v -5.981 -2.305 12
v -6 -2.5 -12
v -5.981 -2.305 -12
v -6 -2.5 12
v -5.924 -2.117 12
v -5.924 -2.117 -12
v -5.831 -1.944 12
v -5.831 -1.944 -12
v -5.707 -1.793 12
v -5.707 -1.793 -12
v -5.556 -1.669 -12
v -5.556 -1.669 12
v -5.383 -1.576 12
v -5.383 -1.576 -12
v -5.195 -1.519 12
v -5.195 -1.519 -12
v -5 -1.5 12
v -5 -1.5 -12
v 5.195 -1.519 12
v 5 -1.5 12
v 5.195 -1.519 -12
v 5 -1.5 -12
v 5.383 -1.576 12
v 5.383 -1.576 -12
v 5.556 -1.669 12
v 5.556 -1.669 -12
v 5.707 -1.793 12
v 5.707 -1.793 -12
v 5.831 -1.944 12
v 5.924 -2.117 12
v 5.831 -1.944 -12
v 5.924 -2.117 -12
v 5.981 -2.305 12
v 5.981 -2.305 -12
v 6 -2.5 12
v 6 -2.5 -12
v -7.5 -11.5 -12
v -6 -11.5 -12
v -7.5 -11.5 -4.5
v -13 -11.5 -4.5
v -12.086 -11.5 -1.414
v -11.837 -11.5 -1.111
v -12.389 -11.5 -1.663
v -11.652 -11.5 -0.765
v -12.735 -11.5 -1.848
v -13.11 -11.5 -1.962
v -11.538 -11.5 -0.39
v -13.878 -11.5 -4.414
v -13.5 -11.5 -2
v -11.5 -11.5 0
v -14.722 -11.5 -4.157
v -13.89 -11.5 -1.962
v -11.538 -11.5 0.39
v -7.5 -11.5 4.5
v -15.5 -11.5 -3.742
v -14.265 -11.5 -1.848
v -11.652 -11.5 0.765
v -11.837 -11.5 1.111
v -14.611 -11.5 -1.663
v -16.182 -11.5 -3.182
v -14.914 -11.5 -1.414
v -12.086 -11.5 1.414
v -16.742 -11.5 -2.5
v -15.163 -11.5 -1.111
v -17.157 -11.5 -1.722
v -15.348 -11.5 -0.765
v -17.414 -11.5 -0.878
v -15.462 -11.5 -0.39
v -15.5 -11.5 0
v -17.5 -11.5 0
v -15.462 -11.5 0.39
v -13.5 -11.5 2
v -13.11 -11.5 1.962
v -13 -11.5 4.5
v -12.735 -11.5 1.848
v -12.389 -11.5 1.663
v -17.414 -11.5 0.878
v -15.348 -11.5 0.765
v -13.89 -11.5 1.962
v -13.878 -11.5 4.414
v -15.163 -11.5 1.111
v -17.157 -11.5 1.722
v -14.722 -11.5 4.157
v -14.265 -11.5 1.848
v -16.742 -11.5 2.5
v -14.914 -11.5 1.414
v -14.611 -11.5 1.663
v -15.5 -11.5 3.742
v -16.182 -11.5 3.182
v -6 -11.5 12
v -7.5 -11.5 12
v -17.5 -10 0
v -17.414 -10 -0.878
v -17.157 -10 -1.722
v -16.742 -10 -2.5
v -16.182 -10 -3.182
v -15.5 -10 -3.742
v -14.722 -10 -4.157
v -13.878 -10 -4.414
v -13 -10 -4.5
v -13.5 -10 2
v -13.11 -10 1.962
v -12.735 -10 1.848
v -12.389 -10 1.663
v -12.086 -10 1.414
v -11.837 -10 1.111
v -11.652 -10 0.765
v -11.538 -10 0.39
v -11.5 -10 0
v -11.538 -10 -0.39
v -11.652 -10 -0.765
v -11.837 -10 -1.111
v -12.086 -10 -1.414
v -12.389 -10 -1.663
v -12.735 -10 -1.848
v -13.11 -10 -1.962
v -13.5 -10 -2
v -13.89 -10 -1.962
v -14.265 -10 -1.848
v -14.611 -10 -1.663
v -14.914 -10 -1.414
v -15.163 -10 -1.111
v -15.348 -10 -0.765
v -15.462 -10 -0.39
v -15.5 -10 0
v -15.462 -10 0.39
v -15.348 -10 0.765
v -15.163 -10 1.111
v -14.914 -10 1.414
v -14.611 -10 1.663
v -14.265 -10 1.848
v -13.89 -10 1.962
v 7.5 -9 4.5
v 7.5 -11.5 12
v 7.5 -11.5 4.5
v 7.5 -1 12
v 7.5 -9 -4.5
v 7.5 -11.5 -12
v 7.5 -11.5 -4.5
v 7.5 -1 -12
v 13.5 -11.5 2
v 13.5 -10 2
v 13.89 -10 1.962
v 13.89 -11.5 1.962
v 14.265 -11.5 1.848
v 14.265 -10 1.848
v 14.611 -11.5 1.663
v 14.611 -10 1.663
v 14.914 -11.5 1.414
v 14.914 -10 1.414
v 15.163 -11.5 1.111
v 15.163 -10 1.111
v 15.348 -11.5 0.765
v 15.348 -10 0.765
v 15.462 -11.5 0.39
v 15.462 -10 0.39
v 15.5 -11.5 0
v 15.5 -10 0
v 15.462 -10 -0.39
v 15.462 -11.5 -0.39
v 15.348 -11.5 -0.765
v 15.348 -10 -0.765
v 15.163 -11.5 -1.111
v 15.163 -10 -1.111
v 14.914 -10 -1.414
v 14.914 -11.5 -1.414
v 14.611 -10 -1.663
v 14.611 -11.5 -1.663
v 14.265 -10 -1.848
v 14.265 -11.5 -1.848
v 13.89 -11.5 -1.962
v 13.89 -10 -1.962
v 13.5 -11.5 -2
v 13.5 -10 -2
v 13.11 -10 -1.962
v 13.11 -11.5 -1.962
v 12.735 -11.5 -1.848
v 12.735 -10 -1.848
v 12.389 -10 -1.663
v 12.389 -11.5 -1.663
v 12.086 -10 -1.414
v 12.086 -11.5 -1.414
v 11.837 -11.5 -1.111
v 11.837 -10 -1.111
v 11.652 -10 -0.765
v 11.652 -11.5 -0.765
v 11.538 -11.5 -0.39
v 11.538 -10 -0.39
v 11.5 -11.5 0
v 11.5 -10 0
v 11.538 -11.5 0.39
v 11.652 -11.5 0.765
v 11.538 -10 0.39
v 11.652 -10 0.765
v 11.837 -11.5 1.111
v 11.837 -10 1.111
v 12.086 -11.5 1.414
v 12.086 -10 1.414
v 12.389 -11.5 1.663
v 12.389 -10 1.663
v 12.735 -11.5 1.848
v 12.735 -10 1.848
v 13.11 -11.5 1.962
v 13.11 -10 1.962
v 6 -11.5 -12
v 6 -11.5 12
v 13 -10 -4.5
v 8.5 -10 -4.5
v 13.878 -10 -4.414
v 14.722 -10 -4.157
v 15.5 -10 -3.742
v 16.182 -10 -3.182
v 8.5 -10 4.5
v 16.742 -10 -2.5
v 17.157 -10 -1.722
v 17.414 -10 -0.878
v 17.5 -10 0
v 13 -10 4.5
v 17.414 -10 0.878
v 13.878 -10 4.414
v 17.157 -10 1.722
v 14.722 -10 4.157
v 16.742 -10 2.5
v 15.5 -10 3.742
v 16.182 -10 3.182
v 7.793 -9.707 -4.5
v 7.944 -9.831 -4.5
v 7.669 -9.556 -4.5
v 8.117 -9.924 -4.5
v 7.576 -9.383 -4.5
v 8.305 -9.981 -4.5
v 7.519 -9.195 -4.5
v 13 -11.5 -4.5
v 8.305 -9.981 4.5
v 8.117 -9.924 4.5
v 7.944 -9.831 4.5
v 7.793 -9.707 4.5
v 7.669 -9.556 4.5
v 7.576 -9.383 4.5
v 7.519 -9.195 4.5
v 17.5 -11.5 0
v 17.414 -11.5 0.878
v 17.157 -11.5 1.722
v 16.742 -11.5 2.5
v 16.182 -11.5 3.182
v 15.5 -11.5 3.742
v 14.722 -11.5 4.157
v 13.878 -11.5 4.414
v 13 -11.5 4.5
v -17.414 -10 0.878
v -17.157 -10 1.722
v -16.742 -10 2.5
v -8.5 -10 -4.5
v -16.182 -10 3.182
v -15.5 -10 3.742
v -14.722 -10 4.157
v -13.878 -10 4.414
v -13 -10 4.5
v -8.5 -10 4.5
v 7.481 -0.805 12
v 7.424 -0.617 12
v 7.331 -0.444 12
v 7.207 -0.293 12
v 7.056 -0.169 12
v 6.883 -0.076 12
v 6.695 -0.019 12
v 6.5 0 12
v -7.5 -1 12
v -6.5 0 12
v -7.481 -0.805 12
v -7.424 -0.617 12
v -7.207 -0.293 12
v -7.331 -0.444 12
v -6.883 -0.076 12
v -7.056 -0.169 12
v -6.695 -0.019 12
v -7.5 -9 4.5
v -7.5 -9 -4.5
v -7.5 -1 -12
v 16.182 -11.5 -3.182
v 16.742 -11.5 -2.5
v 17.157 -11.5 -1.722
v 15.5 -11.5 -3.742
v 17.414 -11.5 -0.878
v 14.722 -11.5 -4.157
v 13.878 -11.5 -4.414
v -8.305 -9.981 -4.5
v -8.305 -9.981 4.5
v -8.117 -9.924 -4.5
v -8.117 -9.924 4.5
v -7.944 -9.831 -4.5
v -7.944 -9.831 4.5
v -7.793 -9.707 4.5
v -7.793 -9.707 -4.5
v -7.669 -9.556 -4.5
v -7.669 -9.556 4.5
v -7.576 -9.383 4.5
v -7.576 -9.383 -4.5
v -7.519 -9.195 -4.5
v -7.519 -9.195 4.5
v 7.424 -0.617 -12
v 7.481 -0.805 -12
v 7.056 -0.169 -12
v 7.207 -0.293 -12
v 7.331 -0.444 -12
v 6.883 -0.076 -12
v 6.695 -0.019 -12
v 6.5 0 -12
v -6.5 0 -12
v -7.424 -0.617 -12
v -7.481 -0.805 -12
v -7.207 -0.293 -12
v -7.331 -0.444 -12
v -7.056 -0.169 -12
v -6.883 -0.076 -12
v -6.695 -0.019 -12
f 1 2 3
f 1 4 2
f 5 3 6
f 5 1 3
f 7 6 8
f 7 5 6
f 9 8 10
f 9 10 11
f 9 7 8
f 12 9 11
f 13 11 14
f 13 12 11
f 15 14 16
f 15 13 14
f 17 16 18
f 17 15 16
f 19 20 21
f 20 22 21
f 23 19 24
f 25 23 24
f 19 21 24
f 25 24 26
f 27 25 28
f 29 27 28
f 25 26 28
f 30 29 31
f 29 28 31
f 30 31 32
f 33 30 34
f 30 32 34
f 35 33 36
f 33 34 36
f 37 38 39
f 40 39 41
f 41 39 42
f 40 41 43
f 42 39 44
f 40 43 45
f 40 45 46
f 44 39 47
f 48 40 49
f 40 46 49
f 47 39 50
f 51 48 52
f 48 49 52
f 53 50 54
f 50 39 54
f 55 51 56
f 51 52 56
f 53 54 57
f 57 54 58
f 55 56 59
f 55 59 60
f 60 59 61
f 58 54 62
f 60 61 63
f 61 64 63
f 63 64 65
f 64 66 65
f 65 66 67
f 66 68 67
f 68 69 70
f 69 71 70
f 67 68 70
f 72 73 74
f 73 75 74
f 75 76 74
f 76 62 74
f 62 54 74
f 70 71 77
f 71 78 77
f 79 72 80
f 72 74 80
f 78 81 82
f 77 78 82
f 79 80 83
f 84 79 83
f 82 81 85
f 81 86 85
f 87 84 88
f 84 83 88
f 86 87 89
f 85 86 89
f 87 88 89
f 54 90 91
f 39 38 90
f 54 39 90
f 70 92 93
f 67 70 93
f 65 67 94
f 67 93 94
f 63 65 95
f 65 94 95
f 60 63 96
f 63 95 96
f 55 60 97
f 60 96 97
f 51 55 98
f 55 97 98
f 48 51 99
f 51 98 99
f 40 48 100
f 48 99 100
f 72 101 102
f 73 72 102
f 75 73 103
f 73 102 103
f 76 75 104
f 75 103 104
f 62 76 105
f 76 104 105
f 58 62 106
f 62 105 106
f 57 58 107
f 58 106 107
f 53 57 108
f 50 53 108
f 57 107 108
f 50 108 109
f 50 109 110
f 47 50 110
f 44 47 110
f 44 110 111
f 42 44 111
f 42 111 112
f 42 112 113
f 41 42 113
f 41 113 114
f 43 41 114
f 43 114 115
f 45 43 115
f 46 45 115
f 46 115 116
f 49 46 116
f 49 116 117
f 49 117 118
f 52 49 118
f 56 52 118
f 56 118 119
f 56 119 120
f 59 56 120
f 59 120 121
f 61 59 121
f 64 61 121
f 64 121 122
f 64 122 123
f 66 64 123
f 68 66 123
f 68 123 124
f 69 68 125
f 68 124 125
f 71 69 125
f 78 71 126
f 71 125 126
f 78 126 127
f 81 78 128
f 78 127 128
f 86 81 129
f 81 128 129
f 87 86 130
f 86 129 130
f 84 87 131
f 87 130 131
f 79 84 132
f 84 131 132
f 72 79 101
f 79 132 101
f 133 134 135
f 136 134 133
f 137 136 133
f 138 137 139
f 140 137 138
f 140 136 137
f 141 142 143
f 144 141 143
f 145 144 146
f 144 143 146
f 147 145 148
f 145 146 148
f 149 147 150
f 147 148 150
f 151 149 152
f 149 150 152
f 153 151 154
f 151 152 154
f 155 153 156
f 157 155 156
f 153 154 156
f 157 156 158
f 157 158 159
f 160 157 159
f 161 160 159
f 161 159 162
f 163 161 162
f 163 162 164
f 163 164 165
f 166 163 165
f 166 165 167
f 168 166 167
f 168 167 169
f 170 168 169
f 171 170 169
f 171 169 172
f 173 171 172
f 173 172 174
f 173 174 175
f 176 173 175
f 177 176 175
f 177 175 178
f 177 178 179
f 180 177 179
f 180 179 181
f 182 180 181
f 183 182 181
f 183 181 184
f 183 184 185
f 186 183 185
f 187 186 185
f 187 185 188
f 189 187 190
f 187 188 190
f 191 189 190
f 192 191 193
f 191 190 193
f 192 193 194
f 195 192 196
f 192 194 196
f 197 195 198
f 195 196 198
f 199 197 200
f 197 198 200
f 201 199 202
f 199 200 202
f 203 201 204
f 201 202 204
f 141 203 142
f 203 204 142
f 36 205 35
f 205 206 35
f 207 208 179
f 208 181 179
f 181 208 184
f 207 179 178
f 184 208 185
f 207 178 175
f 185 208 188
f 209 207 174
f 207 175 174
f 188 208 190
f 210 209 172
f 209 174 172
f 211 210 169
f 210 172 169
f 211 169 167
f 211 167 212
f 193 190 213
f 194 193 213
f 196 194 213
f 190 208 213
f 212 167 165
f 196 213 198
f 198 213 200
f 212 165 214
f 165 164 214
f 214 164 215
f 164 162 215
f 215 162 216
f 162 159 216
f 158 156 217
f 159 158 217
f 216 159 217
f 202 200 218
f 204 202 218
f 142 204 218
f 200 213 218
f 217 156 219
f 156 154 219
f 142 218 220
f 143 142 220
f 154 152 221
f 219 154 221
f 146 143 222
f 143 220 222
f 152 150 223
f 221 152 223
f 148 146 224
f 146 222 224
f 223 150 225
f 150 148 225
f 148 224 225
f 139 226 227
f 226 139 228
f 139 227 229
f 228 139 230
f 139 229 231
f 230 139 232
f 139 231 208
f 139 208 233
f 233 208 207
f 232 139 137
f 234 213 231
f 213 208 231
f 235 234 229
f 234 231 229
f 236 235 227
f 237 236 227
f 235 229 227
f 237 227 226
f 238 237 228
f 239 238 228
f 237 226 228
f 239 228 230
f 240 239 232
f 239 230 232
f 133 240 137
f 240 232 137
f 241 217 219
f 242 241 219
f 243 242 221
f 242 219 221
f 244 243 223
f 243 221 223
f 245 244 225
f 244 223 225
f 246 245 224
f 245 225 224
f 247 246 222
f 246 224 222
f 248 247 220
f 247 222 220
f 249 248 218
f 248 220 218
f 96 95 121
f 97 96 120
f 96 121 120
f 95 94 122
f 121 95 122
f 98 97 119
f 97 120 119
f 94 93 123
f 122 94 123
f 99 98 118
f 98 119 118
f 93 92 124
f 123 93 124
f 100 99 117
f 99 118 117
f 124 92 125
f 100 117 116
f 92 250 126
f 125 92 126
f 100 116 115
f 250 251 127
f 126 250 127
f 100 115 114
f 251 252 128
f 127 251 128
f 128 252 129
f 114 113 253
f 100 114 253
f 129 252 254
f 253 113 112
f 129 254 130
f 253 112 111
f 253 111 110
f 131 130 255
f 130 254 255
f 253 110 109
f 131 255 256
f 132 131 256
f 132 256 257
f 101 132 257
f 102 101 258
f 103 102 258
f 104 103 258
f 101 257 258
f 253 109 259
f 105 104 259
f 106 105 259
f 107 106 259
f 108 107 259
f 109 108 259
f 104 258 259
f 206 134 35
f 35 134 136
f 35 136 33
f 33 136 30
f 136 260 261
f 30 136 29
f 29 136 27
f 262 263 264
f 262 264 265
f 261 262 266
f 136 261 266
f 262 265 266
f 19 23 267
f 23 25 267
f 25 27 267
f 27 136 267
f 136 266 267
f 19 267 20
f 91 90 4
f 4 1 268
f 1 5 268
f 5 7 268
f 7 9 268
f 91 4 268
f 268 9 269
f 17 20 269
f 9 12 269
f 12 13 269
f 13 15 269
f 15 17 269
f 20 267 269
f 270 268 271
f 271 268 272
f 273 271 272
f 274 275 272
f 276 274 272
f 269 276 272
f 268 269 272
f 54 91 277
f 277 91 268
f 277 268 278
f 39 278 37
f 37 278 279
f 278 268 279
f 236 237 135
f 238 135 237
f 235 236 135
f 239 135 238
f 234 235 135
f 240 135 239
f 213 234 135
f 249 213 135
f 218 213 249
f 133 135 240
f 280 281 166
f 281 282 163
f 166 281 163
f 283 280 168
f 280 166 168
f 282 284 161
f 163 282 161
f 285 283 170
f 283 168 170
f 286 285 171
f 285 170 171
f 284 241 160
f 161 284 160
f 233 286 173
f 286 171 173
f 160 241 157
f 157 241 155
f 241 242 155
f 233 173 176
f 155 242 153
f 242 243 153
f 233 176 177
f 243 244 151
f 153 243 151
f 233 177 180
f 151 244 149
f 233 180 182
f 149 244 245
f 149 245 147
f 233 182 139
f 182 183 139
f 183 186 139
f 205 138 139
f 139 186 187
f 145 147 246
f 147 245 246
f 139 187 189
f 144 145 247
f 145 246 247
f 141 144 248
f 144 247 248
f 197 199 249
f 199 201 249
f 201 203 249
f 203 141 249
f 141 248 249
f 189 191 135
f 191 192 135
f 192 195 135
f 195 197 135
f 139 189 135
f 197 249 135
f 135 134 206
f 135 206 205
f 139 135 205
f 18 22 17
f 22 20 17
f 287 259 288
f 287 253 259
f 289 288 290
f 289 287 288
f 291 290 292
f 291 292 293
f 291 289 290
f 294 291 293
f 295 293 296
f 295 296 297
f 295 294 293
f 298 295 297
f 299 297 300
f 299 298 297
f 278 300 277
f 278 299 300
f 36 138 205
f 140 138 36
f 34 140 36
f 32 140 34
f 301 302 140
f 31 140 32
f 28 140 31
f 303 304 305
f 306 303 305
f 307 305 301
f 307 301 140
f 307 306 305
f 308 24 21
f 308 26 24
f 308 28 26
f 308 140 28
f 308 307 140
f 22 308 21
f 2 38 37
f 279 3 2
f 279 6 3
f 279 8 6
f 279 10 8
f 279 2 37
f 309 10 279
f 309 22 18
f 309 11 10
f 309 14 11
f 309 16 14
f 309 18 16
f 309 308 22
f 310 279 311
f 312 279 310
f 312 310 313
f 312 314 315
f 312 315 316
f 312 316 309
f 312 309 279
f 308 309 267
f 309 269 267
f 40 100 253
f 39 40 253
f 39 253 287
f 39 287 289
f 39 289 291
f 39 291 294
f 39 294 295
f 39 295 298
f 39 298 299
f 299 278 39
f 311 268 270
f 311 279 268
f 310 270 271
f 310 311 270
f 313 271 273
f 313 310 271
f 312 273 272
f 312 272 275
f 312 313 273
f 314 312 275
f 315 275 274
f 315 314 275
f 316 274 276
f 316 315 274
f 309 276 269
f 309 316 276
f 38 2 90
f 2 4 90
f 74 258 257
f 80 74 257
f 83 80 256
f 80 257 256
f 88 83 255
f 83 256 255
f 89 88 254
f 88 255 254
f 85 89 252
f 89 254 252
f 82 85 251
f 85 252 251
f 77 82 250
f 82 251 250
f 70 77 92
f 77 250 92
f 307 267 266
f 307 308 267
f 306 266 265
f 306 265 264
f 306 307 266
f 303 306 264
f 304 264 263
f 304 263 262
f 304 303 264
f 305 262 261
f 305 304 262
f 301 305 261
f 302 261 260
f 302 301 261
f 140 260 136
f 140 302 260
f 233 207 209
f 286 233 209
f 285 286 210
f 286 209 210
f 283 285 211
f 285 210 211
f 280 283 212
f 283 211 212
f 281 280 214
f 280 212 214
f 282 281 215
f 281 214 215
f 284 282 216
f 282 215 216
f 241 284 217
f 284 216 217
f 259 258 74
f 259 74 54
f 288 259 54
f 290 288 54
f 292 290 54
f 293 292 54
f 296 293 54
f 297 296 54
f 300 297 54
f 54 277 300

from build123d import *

# Parameters (mm, degrees)
SALIENTE_EXTRUIR2_DEPTH = 12
CROQUIS4_W              = 10
CROQUIS4_H              = 7.5
CORTAR_EXTRUIR2_DEPTH   = 24.457408211
CROQUIS6_R              = 2
CORTAR_EXTRUIR3_DEPTH   = 24.457408211
CORTAR_EXTRUIR4_DEPTH   = 24.457408211
REDONDEO1_R             = 1
REDONDEO2_R             = 1
REDONDEO3_R             = 1
REDONDEO4_R             = 1
REDONDEO5_R             = 1
REDONDEO6_R             = 1


with BuildPart() as part:
    # Croquis1 → Saliente-Extruir2 (new, symmetric)
    with BuildSketch(Plane.XY):
        Polygon((-17.5, -11.5), (-17.5, -10), (-7.5, -10), (-7.5, 0), (7.5, 0), (7.5, -10), (17.5, -10), (17.5, -11.5), (6, -11.5), (6, -1.5), (-6, -1.5), (-6, -11.5), align=None)
    extrude(amount=SALIENTE_EXTRUIR2_DEPTH, both=True)

    # Croquis4 → Cortar-Extruir2 (cut, through all)
    with BuildSketch(Plane(origin=(0, -10, 0), x_dir=(1, 0, 0), z_dir=(0, 1, 0))):
        with Locations((-12.5, 8.25)):
            Rectangle(CROQUIS4_W, CROQUIS4_H)
        with Locations((12.5, 8.25)):
            Rectangle(CROQUIS4_W, CROQUIS4_H)
        with Locations((12.5, -8.25)):
            Rectangle(CROQUIS4_W, CROQUIS4_H)
        with Locations((-12.5, -8.25)):
            Rectangle(CROQUIS4_W, CROQUIS4_H)
    extrude(amount=-CORTAR_EXTRUIR2_DEPTH, mode=Mode.SUBTRACT)

    # Croquis6 → Cortar-Extruir3 (cut, through all)
    with BuildSketch(Plane(origin=(0, -10, 0), x_dir=(1, 0, 0), z_dir=(0, 1, 0))):
        with Locations(Location((-13.5, 0, 0), (0, 0, 270))):
            Circle(CROQUIS6_R)
        with Locations(Location((13.5, 0, 0), (0, 0, 270))):
            Circle(CROQUIS6_R)
    extrude(amount=-CORTAR_EXTRUIR3_DEPTH, mode=Mode.SUBTRACT)

    # Croquis7 → Cortar-Extruir4 (cut, through all)
    with BuildSketch(Plane(origin=(0, -10, 0), x_dir=(1, 0, 0), z_dir=(0, 1, 0))):
        with BuildLine():
            ThreePointArc((-17.5, 0), (-16.181980515, 3.181980515), (-13, 4.5))
            Line((-13, 4.5), (-17.5, 4.5))
            Line((-17.5, 4.5), (-17.5, 0))
        make_face()
        with BuildLine():
            ThreePointArc((-13, -4.5), (-16.181980515, -3.181980515), (-17.5, 0))
            Line((-17.5, 0), (-17.5, -4.5))
            Line((-17.5, -4.5), (-13, -4.5))
        make_face()
        with BuildLine():
            Line((17.5, 4.5), (13, 4.5))
            ThreePointArc((13, 4.5), (16.181980515, 3.181980515), (17.5, 0))
            Line((17.5, 0), (17.5, 4.5))
        make_face()
        with BuildLine():
            Line((17.5, -4.5), (17.5, 0))
            ThreePointArc((17.5, 0), (16.181980515, -3.181980515), (13, -4.5))
            Line((13, -4.5), (17.5, -4.5))
        make_face()
    extrude(amount=-CORTAR_EXTRUIR4_DEPTH, mode=Mode.SUBTRACT)

    # Redondeo1
    redondeo1_edges = [part.edges().sort_by_distance(p)[0] for p in [
        (-7.5, -10, 0),
    ]]
    fillet(redondeo1_edges, radius=REDONDEO1_R)

    # Redondeo2
    redondeo2_edges = [part.edges().sort_by_distance(p)[0] for p in [
        (7.5, -10, 0),
    ]]
    fillet(redondeo2_edges, radius=REDONDEO2_R)

    # Redondeo3
    redondeo3_edges = [part.edges().sort_by_distance(p)[0] for p in [
        (-6, -1.5, 0),
    ]]
    fillet(redondeo3_edges, radius=REDONDEO3_R)

    # Redondeo4
    redondeo4_edges = [part.edges().sort_by_distance(p)[0] for p in [
        (6, -1.5, 0),
    ]]
    fillet(redondeo4_edges, radius=REDONDEO4_R)

    # Redondeo5
    redondeo5_edges = [part.edges().sort_by_distance(p)[0] for p in [
        (-7.5, 0, 0),
    ]]
    fillet(redondeo5_edges, radius=REDONDEO5_R)

    # Redondeo6
    redondeo6_edges = [part.edges().sort_by_distance(p)[0] for p in [
        (7.5, 0, 0),
    ]]
    fillet(redondeo6_edges, radius=REDONDEO6_R)


solid = part.part
